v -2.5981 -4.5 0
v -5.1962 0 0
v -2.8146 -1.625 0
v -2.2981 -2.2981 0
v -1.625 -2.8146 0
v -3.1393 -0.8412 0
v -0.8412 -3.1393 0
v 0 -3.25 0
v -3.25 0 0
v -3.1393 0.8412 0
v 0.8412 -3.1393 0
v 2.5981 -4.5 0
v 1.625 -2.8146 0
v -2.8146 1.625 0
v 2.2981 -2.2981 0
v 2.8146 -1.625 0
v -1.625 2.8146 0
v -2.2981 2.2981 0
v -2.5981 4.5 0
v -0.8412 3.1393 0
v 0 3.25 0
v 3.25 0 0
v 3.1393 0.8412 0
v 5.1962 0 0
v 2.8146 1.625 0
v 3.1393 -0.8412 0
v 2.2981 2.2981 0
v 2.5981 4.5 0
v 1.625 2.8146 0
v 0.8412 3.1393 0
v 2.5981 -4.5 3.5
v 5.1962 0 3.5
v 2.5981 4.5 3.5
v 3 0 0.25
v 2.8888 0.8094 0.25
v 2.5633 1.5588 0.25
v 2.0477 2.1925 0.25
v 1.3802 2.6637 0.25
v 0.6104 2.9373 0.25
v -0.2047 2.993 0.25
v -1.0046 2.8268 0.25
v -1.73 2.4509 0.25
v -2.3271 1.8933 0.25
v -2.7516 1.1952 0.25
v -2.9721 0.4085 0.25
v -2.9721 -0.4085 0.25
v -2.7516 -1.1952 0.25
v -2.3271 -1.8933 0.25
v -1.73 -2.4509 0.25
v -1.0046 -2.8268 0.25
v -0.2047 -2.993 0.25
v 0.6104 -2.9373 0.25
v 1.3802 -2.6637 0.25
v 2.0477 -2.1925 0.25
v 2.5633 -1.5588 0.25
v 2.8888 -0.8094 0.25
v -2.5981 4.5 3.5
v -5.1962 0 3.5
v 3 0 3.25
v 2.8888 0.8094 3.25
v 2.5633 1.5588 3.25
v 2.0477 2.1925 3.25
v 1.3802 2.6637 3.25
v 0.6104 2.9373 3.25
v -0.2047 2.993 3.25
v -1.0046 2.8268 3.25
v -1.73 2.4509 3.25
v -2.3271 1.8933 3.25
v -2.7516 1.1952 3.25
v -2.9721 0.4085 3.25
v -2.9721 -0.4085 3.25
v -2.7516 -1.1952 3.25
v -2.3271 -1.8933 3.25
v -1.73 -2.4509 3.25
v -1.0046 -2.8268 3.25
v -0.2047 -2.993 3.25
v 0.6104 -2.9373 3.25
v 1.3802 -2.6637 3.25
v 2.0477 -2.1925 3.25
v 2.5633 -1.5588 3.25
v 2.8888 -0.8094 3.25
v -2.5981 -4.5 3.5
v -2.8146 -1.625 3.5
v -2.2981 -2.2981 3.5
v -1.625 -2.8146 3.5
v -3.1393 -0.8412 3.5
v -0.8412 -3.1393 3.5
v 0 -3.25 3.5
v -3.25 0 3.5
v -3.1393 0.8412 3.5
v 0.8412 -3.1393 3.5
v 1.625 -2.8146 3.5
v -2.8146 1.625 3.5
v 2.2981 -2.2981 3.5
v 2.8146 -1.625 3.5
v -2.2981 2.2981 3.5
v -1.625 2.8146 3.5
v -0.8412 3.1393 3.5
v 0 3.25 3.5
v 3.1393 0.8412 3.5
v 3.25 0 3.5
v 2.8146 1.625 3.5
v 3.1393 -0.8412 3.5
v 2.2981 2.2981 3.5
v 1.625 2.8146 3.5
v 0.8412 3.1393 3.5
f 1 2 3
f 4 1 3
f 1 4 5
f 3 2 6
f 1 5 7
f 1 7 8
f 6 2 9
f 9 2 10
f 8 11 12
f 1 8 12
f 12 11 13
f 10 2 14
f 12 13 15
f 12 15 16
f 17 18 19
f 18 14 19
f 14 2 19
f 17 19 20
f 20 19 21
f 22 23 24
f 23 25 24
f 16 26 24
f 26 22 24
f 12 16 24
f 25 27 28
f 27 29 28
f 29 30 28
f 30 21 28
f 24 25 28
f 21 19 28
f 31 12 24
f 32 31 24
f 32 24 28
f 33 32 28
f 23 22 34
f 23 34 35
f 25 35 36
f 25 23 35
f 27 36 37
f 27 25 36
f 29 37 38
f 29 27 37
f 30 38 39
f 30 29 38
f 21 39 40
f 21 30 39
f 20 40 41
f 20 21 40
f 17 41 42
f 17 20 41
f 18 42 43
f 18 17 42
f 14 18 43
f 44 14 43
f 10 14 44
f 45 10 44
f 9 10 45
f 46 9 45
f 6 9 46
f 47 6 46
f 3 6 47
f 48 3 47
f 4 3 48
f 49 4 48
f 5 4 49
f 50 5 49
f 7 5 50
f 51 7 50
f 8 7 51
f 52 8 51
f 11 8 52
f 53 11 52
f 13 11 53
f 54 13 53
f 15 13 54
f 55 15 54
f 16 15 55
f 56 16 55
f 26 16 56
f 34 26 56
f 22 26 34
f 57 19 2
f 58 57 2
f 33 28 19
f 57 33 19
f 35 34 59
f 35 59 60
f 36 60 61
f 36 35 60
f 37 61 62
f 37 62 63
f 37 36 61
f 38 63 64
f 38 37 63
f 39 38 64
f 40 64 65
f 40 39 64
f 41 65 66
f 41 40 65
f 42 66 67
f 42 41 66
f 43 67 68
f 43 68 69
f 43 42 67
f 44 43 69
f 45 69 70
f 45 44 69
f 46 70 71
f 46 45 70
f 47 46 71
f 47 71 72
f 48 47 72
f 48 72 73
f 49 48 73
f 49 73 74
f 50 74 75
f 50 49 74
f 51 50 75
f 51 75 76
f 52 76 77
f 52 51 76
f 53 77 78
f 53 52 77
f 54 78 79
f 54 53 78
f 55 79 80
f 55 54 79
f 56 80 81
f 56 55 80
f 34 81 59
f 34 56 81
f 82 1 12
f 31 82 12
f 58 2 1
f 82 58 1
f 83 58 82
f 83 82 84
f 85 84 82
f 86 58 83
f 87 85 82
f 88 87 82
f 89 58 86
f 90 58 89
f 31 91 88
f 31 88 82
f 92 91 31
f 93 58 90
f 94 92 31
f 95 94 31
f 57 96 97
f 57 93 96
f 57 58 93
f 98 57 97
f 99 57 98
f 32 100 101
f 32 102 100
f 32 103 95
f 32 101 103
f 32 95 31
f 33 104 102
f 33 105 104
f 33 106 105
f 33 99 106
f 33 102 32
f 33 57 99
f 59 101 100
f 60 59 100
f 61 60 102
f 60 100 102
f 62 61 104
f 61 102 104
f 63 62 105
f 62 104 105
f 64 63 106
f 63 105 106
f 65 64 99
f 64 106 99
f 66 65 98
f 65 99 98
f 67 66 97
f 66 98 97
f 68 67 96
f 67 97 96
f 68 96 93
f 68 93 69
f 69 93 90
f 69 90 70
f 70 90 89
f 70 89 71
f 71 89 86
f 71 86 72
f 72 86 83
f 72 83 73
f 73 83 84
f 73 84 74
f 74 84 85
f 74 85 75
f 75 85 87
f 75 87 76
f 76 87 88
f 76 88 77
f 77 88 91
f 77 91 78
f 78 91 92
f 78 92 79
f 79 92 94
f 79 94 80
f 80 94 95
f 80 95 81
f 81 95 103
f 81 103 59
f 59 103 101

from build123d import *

# Parameters (mm, degrees)
IZIM1_R                     = 3
Y_KSEKLIK_EKSTR_ZYON1_DEPTH = 3.5
PAH1_SIZE                   = 0.25


with BuildPart() as part:
    # Çizim1 → Yükseklik-Ekstrüzyon1 (new body)
    with BuildSketch(Plane.XY):
        Polygon((5.196152423, 0), (2.598076211, 4.5), (-2.598076211, 4.5), (-5.196152423, 0), (-2.598076211, -4.5), (2.598076211, -4.5), align=None)
        Circle(IZIM1_R, mode=Mode.SUBTRACT)
    extrude(amount=Y_KSEKLIK_EKSTR_ZYON1_DEPTH)

    # Pah1
    pah1_edges = [part.edges().sort_by_distance(p)[0] for p in [
        (-3, 0, 0),
        (-3, 0, 3.5),
    ]]
    chamfer(pah1_edges, length=PAH1_SIZE)


solid = part.part
